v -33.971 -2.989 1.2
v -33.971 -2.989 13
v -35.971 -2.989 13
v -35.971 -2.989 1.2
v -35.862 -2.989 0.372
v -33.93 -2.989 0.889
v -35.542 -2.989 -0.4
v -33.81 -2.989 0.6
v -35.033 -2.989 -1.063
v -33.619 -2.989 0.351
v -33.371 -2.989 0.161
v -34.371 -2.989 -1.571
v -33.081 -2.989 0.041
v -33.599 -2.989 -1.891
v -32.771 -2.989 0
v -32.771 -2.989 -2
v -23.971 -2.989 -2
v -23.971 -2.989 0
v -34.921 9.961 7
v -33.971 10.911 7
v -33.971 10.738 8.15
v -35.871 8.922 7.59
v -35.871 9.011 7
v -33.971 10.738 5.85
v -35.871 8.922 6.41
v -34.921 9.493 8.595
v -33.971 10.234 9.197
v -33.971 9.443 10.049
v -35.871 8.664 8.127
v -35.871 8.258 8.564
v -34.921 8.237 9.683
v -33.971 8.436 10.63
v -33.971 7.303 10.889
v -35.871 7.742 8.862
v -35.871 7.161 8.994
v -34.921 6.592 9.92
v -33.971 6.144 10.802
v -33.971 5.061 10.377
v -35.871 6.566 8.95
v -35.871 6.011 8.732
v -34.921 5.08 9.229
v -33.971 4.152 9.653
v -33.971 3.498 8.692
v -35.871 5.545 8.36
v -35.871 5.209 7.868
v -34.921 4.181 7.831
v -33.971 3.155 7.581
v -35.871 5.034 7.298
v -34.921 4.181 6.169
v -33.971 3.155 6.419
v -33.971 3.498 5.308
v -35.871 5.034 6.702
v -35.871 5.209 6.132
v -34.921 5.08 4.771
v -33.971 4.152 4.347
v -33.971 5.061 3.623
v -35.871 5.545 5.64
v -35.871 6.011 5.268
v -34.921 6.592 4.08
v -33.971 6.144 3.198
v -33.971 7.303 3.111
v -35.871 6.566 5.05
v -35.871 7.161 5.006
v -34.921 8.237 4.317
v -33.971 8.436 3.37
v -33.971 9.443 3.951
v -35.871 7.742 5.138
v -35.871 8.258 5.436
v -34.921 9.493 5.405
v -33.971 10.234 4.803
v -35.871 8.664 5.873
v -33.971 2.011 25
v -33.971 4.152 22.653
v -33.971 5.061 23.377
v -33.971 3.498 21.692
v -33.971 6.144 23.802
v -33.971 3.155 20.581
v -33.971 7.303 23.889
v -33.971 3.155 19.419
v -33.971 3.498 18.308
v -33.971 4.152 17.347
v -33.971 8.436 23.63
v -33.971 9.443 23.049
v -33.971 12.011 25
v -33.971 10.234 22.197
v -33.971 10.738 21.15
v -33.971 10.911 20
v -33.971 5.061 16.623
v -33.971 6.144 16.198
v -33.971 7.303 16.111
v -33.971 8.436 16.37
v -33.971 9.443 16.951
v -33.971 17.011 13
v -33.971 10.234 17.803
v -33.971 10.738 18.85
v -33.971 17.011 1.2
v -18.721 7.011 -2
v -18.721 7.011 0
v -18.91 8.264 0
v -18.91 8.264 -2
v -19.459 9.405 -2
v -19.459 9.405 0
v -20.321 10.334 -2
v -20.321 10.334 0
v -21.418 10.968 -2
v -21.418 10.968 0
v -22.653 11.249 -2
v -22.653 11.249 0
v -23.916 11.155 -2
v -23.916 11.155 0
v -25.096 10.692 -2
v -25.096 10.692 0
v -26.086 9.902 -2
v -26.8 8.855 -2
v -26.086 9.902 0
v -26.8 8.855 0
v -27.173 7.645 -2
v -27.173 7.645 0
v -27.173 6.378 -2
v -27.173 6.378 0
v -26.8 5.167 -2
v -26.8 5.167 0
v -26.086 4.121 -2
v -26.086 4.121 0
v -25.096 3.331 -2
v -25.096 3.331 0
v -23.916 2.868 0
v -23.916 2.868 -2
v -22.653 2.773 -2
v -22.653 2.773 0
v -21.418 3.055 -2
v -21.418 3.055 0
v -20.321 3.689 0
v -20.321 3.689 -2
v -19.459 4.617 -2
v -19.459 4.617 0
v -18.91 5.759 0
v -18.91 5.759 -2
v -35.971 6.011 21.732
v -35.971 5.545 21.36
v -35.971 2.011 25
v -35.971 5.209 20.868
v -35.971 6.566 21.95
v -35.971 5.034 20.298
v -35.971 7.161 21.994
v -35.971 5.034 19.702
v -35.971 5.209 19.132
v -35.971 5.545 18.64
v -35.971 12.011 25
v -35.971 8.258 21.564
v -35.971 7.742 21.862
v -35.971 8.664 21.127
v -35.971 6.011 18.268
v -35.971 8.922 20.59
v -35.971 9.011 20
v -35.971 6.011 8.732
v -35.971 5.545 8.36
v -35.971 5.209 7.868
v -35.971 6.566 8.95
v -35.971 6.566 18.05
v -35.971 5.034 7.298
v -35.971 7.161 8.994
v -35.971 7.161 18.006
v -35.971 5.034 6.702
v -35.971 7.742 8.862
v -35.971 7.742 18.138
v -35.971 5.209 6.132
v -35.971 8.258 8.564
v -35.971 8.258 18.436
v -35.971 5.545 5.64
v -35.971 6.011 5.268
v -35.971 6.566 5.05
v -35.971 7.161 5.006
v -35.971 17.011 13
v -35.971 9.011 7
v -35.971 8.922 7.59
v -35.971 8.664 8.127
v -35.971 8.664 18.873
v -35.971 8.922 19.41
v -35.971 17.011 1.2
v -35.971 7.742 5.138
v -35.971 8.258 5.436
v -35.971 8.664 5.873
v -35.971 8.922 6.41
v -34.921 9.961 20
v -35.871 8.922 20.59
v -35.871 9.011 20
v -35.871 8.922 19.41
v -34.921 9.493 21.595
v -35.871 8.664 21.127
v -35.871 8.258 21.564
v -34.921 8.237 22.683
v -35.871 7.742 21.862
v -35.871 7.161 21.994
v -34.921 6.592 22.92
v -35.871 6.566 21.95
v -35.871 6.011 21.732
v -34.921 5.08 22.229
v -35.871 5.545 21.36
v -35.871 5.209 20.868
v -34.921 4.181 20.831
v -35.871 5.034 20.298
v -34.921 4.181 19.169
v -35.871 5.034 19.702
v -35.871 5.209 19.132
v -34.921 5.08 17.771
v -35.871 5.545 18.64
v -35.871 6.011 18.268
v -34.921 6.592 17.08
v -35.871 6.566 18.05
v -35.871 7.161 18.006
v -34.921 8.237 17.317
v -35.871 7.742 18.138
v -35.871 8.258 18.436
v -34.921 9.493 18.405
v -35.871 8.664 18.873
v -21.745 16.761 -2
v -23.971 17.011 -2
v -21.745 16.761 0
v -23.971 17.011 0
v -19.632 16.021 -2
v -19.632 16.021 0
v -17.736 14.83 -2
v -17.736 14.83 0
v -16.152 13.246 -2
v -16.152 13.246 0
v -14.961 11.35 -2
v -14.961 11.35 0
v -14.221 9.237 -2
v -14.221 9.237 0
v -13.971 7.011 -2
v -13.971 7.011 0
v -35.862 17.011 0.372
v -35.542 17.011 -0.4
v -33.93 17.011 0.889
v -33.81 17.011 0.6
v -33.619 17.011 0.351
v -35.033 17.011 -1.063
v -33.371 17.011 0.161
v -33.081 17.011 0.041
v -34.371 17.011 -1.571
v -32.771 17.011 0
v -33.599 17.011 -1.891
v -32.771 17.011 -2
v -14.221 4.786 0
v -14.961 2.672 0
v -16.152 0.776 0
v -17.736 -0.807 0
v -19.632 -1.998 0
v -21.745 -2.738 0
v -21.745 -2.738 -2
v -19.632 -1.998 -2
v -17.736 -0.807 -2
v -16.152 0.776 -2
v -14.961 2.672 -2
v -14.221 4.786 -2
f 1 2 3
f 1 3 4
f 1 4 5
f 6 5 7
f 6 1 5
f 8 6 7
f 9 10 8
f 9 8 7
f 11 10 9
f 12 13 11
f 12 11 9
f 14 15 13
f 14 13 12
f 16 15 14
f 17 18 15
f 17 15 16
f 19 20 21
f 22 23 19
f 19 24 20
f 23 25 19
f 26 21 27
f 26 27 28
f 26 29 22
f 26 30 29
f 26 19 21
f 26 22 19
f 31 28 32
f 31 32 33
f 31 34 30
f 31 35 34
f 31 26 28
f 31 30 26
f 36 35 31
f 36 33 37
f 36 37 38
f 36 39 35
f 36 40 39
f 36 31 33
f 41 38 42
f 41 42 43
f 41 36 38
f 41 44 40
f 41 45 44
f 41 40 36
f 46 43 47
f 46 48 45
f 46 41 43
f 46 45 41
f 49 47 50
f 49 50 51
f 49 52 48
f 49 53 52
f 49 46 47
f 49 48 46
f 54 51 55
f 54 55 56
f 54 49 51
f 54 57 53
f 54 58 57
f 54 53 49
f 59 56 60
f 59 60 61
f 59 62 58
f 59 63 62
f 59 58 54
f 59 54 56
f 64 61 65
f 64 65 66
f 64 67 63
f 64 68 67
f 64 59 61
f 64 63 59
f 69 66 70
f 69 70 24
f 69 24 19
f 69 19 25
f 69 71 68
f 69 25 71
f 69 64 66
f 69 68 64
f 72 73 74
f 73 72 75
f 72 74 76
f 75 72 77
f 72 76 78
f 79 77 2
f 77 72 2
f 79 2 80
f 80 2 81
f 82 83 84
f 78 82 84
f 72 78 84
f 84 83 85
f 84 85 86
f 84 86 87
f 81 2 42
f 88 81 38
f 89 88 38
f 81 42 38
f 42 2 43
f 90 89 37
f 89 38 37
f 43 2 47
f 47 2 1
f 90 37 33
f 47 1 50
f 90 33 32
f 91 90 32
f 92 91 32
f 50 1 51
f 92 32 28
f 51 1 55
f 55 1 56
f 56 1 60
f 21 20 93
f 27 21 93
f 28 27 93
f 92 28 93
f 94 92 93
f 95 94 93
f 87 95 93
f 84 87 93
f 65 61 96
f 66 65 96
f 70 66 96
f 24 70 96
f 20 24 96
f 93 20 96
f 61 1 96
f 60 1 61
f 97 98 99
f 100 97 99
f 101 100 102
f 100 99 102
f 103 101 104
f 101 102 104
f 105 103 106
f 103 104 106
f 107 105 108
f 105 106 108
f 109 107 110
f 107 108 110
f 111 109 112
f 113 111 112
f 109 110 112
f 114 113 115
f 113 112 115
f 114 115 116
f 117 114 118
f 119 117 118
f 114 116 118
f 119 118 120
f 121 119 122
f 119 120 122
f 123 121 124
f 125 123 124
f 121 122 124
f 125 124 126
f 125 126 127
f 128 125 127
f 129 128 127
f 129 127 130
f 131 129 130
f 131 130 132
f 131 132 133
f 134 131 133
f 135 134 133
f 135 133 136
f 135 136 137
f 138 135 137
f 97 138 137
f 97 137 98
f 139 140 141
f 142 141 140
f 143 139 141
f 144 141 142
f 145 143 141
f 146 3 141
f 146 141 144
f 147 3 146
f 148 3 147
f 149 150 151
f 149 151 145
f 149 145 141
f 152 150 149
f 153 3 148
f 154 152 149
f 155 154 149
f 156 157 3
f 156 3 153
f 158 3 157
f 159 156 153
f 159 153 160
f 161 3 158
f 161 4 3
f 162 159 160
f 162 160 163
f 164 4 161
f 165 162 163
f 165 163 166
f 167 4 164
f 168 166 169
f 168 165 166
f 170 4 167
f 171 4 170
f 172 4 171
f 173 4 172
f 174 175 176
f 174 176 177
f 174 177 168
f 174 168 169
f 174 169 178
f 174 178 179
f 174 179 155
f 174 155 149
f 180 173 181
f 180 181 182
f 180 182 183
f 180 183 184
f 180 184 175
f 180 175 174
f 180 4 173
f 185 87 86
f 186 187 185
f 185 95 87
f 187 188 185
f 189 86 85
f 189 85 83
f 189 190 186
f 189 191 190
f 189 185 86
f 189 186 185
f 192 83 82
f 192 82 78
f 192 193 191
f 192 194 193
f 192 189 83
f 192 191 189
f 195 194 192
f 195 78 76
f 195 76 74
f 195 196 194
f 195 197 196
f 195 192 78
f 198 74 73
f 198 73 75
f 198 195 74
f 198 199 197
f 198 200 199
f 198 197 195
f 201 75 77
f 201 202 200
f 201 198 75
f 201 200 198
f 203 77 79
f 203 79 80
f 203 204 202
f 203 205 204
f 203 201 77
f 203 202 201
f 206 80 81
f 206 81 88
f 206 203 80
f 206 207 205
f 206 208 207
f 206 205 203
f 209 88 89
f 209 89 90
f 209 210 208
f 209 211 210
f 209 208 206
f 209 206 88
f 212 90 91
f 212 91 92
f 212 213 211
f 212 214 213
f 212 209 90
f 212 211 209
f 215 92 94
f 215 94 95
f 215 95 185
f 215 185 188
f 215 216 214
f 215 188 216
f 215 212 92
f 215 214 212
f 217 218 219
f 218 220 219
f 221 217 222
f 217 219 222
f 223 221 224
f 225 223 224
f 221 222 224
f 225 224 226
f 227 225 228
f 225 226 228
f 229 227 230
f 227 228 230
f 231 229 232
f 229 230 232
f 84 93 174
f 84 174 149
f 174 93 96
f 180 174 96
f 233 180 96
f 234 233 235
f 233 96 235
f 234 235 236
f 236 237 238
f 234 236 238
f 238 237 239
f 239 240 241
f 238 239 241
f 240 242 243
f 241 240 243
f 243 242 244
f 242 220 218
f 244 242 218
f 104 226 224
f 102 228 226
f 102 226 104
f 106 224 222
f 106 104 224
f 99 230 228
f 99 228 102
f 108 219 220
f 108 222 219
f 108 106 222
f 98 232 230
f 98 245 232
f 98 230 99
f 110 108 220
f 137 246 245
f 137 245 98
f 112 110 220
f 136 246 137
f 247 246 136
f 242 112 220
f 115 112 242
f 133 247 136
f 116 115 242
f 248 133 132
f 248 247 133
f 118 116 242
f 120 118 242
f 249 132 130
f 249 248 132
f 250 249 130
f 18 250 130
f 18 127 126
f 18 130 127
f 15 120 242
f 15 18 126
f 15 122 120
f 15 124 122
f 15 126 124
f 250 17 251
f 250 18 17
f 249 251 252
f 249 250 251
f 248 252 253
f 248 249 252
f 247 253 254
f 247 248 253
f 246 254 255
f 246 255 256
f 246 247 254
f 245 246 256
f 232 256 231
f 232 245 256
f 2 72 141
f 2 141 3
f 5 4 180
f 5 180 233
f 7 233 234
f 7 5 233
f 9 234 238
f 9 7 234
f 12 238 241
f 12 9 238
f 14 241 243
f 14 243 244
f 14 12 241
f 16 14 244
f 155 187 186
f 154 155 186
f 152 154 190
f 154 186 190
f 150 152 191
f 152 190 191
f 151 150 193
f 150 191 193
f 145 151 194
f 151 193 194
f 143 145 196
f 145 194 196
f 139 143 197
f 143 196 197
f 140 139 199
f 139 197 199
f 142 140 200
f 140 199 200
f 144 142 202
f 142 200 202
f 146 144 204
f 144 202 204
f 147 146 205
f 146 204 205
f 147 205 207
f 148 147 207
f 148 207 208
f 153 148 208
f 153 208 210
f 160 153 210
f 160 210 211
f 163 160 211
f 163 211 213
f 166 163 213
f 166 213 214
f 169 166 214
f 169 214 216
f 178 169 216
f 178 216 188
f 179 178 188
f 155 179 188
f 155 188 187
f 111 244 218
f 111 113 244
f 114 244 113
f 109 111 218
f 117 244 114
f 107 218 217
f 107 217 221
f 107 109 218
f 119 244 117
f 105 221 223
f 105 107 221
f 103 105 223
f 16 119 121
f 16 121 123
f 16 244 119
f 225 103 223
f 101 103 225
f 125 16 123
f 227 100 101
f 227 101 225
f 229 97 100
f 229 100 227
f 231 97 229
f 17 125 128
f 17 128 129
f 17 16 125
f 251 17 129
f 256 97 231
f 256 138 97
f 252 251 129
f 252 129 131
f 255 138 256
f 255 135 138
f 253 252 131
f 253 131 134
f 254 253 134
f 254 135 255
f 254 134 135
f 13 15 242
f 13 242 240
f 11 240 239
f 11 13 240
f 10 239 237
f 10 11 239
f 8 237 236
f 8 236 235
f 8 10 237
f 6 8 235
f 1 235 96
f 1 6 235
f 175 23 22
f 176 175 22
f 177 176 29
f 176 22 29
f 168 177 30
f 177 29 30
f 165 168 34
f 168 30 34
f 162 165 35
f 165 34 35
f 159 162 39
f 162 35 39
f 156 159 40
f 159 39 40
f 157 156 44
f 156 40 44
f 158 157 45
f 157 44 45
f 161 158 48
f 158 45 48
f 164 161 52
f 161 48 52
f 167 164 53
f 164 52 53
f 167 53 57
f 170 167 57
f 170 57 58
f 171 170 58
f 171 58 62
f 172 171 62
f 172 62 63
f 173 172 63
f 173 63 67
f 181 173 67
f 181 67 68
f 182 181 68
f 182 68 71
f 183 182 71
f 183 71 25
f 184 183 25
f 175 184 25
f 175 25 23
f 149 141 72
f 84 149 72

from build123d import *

# Parameters (mm, degrees)
SKETCH_1_W                       = 2
SKETCH_1_H                       = 20
SM_BASE_FLANGE_1_DEPTH           = 25
SM_EDGE_FLANGE_1_STRIP_W         = 10.4
SM_EDGE_FLANGE_1_STRIP_H         = 2
SM_EDGE_FLANGE_1_STRIP_CUT_DEPTH = 20
SM_EDGE_FLANGE_1_DEPTH           = 20
SKETCH_6_R                       = 4.25
CUT_EXTRUDE_1_DEPTH              = 10
FILLET_1_R                       = 10
SKETCH_7_R                       = 2
CUT_EXTRUDE_2_DEPTH              = 10
CUT_EXTRUDE_3_DEPTH              = 5
CHAMFER_1_SIZE                   = 1.9


# Sheet-metal steps are written as plain solids
with BuildPart() as part:
    # Sketch 1 → Базовая кромка1 (new body)
    with BuildSketch(Plane.XY):
        with Locations((-34.970714213, 7.011351052)):
            Rectangle(SKETCH_1_W, SKETCH_1_H)
    extrude(amount=SM_BASE_FLANGE_1_DEPTH)

    # Ребро-кромка1 strip (across the edge) → Ребро-кромка1 strip cut (cut)
    with BuildSketch(Plane(origin=(-33.970714213, -2.988648948, 0), x_dir=(0, 0, 1), z_dir=(0, 1, 0))):
        with Locations((-4, -1)):
            Rectangle(SM_EDGE_FLANGE_1_STRIP_W, SM_EDGE_FLANGE_1_STRIP_H)
    extrude(amount=SM_EDGE_FLANGE_1_STRIP_CUT_DEPTH, mode=Mode.SUBTRACT)

    # Ребро-кромка1 section (across the edge) → Ребро-кромка1 (add)
    with BuildSketch(Plane(origin=(-33.970714213, -2.988648948, 0), x_dir=(0, 0, 1), z_dir=(0, 1, 0))):
        with BuildLine():
            Line((-2, 1.2), (-2, 20))
            Line((-2, 20), (0, 20))
            Line((0, 20), (0, 1.2))
            ThreePointArc((0, 1.2), (0.351471863, 0.351471863), (1.2, 0))
            Line((1.2, 0), (1.2, -2))
            ThreePointArc((1.2, -2), (-1.0627417, -1.0627417), (-2, 1.2))
        make_face()
    extrude(amount=SM_EDGE_FLANGE_1_DEPTH)

    # Эскиз6 → Вырез-Вытянуть1 (cut)
    with BuildSketch(Plane.XY):
        with Locations((-22.970714213, 7.011351052)):
            Circle(SKETCH_6_R)
    extrude(amount=-CUT_EXTRUDE_1_DEPTH, mode=Mode.SUBTRACT)

    # Скругление1
    fillet_1_edges = [part.edges().sort_by_distance(p)[0] for p in [
        (-13.970714213, 17.011351052, -1),
        (-13.970714213, -2.988648948, -1),
    ]]
    fillet(fillet_1_edges, radius=FILLET_1_R - 0.0001)  # a hair under: the kernel refuses the full size

    # Эскиз7 → Вырез-Вытянуть2 (cut)
    with BuildSketch(Plane(origin=(-33.970714213, 0, 0), x_dir=(0, 0, -1), z_dir=(1, 0, 0))):
        with Locations(Location((-20, 7.011351052, 0), (0, 0, 90))):
            Circle(SKETCH_7_R)
        with Locations(Location((-7, 7.011351052, 0), (0, 0, 90))):
            Circle(SKETCH_7_R)
    extrude(amount=-CUT_EXTRUDE_2_DEPTH, mode=Mode.SUBTRACT)

    # Эскиз9 → Вырез-Вытянуть3 (cut)
    with BuildSketch(Plane(origin=(-33.970714213, 0, 0), x_dir=(0, 0, -1), z_dir=(1, 0, 0))):
        Polygon((-25, 17.011351052), (-13, 17.011351052), (-25, 12.011351052), align=None)
        Polygon((-25, 2.011351052), (-13, -2.988648948), (-25, -2.988648948), align=None)
    extrude(amount=-CUT_EXTRUDE_3_DEPTH, mode=Mode.SUBTRACT)

    # Фаска1
    chamfer_1_edges = [part.edges().sort_by_distance(p)[0] for p in [
        (-33.970714213, 5.011351052, 20),
        (-33.970714213, 5.011351052, 7),
    ]]
    chamfer(chamfer_1_edges, length=CHAMFER_1_SIZE)


solid = part.part
